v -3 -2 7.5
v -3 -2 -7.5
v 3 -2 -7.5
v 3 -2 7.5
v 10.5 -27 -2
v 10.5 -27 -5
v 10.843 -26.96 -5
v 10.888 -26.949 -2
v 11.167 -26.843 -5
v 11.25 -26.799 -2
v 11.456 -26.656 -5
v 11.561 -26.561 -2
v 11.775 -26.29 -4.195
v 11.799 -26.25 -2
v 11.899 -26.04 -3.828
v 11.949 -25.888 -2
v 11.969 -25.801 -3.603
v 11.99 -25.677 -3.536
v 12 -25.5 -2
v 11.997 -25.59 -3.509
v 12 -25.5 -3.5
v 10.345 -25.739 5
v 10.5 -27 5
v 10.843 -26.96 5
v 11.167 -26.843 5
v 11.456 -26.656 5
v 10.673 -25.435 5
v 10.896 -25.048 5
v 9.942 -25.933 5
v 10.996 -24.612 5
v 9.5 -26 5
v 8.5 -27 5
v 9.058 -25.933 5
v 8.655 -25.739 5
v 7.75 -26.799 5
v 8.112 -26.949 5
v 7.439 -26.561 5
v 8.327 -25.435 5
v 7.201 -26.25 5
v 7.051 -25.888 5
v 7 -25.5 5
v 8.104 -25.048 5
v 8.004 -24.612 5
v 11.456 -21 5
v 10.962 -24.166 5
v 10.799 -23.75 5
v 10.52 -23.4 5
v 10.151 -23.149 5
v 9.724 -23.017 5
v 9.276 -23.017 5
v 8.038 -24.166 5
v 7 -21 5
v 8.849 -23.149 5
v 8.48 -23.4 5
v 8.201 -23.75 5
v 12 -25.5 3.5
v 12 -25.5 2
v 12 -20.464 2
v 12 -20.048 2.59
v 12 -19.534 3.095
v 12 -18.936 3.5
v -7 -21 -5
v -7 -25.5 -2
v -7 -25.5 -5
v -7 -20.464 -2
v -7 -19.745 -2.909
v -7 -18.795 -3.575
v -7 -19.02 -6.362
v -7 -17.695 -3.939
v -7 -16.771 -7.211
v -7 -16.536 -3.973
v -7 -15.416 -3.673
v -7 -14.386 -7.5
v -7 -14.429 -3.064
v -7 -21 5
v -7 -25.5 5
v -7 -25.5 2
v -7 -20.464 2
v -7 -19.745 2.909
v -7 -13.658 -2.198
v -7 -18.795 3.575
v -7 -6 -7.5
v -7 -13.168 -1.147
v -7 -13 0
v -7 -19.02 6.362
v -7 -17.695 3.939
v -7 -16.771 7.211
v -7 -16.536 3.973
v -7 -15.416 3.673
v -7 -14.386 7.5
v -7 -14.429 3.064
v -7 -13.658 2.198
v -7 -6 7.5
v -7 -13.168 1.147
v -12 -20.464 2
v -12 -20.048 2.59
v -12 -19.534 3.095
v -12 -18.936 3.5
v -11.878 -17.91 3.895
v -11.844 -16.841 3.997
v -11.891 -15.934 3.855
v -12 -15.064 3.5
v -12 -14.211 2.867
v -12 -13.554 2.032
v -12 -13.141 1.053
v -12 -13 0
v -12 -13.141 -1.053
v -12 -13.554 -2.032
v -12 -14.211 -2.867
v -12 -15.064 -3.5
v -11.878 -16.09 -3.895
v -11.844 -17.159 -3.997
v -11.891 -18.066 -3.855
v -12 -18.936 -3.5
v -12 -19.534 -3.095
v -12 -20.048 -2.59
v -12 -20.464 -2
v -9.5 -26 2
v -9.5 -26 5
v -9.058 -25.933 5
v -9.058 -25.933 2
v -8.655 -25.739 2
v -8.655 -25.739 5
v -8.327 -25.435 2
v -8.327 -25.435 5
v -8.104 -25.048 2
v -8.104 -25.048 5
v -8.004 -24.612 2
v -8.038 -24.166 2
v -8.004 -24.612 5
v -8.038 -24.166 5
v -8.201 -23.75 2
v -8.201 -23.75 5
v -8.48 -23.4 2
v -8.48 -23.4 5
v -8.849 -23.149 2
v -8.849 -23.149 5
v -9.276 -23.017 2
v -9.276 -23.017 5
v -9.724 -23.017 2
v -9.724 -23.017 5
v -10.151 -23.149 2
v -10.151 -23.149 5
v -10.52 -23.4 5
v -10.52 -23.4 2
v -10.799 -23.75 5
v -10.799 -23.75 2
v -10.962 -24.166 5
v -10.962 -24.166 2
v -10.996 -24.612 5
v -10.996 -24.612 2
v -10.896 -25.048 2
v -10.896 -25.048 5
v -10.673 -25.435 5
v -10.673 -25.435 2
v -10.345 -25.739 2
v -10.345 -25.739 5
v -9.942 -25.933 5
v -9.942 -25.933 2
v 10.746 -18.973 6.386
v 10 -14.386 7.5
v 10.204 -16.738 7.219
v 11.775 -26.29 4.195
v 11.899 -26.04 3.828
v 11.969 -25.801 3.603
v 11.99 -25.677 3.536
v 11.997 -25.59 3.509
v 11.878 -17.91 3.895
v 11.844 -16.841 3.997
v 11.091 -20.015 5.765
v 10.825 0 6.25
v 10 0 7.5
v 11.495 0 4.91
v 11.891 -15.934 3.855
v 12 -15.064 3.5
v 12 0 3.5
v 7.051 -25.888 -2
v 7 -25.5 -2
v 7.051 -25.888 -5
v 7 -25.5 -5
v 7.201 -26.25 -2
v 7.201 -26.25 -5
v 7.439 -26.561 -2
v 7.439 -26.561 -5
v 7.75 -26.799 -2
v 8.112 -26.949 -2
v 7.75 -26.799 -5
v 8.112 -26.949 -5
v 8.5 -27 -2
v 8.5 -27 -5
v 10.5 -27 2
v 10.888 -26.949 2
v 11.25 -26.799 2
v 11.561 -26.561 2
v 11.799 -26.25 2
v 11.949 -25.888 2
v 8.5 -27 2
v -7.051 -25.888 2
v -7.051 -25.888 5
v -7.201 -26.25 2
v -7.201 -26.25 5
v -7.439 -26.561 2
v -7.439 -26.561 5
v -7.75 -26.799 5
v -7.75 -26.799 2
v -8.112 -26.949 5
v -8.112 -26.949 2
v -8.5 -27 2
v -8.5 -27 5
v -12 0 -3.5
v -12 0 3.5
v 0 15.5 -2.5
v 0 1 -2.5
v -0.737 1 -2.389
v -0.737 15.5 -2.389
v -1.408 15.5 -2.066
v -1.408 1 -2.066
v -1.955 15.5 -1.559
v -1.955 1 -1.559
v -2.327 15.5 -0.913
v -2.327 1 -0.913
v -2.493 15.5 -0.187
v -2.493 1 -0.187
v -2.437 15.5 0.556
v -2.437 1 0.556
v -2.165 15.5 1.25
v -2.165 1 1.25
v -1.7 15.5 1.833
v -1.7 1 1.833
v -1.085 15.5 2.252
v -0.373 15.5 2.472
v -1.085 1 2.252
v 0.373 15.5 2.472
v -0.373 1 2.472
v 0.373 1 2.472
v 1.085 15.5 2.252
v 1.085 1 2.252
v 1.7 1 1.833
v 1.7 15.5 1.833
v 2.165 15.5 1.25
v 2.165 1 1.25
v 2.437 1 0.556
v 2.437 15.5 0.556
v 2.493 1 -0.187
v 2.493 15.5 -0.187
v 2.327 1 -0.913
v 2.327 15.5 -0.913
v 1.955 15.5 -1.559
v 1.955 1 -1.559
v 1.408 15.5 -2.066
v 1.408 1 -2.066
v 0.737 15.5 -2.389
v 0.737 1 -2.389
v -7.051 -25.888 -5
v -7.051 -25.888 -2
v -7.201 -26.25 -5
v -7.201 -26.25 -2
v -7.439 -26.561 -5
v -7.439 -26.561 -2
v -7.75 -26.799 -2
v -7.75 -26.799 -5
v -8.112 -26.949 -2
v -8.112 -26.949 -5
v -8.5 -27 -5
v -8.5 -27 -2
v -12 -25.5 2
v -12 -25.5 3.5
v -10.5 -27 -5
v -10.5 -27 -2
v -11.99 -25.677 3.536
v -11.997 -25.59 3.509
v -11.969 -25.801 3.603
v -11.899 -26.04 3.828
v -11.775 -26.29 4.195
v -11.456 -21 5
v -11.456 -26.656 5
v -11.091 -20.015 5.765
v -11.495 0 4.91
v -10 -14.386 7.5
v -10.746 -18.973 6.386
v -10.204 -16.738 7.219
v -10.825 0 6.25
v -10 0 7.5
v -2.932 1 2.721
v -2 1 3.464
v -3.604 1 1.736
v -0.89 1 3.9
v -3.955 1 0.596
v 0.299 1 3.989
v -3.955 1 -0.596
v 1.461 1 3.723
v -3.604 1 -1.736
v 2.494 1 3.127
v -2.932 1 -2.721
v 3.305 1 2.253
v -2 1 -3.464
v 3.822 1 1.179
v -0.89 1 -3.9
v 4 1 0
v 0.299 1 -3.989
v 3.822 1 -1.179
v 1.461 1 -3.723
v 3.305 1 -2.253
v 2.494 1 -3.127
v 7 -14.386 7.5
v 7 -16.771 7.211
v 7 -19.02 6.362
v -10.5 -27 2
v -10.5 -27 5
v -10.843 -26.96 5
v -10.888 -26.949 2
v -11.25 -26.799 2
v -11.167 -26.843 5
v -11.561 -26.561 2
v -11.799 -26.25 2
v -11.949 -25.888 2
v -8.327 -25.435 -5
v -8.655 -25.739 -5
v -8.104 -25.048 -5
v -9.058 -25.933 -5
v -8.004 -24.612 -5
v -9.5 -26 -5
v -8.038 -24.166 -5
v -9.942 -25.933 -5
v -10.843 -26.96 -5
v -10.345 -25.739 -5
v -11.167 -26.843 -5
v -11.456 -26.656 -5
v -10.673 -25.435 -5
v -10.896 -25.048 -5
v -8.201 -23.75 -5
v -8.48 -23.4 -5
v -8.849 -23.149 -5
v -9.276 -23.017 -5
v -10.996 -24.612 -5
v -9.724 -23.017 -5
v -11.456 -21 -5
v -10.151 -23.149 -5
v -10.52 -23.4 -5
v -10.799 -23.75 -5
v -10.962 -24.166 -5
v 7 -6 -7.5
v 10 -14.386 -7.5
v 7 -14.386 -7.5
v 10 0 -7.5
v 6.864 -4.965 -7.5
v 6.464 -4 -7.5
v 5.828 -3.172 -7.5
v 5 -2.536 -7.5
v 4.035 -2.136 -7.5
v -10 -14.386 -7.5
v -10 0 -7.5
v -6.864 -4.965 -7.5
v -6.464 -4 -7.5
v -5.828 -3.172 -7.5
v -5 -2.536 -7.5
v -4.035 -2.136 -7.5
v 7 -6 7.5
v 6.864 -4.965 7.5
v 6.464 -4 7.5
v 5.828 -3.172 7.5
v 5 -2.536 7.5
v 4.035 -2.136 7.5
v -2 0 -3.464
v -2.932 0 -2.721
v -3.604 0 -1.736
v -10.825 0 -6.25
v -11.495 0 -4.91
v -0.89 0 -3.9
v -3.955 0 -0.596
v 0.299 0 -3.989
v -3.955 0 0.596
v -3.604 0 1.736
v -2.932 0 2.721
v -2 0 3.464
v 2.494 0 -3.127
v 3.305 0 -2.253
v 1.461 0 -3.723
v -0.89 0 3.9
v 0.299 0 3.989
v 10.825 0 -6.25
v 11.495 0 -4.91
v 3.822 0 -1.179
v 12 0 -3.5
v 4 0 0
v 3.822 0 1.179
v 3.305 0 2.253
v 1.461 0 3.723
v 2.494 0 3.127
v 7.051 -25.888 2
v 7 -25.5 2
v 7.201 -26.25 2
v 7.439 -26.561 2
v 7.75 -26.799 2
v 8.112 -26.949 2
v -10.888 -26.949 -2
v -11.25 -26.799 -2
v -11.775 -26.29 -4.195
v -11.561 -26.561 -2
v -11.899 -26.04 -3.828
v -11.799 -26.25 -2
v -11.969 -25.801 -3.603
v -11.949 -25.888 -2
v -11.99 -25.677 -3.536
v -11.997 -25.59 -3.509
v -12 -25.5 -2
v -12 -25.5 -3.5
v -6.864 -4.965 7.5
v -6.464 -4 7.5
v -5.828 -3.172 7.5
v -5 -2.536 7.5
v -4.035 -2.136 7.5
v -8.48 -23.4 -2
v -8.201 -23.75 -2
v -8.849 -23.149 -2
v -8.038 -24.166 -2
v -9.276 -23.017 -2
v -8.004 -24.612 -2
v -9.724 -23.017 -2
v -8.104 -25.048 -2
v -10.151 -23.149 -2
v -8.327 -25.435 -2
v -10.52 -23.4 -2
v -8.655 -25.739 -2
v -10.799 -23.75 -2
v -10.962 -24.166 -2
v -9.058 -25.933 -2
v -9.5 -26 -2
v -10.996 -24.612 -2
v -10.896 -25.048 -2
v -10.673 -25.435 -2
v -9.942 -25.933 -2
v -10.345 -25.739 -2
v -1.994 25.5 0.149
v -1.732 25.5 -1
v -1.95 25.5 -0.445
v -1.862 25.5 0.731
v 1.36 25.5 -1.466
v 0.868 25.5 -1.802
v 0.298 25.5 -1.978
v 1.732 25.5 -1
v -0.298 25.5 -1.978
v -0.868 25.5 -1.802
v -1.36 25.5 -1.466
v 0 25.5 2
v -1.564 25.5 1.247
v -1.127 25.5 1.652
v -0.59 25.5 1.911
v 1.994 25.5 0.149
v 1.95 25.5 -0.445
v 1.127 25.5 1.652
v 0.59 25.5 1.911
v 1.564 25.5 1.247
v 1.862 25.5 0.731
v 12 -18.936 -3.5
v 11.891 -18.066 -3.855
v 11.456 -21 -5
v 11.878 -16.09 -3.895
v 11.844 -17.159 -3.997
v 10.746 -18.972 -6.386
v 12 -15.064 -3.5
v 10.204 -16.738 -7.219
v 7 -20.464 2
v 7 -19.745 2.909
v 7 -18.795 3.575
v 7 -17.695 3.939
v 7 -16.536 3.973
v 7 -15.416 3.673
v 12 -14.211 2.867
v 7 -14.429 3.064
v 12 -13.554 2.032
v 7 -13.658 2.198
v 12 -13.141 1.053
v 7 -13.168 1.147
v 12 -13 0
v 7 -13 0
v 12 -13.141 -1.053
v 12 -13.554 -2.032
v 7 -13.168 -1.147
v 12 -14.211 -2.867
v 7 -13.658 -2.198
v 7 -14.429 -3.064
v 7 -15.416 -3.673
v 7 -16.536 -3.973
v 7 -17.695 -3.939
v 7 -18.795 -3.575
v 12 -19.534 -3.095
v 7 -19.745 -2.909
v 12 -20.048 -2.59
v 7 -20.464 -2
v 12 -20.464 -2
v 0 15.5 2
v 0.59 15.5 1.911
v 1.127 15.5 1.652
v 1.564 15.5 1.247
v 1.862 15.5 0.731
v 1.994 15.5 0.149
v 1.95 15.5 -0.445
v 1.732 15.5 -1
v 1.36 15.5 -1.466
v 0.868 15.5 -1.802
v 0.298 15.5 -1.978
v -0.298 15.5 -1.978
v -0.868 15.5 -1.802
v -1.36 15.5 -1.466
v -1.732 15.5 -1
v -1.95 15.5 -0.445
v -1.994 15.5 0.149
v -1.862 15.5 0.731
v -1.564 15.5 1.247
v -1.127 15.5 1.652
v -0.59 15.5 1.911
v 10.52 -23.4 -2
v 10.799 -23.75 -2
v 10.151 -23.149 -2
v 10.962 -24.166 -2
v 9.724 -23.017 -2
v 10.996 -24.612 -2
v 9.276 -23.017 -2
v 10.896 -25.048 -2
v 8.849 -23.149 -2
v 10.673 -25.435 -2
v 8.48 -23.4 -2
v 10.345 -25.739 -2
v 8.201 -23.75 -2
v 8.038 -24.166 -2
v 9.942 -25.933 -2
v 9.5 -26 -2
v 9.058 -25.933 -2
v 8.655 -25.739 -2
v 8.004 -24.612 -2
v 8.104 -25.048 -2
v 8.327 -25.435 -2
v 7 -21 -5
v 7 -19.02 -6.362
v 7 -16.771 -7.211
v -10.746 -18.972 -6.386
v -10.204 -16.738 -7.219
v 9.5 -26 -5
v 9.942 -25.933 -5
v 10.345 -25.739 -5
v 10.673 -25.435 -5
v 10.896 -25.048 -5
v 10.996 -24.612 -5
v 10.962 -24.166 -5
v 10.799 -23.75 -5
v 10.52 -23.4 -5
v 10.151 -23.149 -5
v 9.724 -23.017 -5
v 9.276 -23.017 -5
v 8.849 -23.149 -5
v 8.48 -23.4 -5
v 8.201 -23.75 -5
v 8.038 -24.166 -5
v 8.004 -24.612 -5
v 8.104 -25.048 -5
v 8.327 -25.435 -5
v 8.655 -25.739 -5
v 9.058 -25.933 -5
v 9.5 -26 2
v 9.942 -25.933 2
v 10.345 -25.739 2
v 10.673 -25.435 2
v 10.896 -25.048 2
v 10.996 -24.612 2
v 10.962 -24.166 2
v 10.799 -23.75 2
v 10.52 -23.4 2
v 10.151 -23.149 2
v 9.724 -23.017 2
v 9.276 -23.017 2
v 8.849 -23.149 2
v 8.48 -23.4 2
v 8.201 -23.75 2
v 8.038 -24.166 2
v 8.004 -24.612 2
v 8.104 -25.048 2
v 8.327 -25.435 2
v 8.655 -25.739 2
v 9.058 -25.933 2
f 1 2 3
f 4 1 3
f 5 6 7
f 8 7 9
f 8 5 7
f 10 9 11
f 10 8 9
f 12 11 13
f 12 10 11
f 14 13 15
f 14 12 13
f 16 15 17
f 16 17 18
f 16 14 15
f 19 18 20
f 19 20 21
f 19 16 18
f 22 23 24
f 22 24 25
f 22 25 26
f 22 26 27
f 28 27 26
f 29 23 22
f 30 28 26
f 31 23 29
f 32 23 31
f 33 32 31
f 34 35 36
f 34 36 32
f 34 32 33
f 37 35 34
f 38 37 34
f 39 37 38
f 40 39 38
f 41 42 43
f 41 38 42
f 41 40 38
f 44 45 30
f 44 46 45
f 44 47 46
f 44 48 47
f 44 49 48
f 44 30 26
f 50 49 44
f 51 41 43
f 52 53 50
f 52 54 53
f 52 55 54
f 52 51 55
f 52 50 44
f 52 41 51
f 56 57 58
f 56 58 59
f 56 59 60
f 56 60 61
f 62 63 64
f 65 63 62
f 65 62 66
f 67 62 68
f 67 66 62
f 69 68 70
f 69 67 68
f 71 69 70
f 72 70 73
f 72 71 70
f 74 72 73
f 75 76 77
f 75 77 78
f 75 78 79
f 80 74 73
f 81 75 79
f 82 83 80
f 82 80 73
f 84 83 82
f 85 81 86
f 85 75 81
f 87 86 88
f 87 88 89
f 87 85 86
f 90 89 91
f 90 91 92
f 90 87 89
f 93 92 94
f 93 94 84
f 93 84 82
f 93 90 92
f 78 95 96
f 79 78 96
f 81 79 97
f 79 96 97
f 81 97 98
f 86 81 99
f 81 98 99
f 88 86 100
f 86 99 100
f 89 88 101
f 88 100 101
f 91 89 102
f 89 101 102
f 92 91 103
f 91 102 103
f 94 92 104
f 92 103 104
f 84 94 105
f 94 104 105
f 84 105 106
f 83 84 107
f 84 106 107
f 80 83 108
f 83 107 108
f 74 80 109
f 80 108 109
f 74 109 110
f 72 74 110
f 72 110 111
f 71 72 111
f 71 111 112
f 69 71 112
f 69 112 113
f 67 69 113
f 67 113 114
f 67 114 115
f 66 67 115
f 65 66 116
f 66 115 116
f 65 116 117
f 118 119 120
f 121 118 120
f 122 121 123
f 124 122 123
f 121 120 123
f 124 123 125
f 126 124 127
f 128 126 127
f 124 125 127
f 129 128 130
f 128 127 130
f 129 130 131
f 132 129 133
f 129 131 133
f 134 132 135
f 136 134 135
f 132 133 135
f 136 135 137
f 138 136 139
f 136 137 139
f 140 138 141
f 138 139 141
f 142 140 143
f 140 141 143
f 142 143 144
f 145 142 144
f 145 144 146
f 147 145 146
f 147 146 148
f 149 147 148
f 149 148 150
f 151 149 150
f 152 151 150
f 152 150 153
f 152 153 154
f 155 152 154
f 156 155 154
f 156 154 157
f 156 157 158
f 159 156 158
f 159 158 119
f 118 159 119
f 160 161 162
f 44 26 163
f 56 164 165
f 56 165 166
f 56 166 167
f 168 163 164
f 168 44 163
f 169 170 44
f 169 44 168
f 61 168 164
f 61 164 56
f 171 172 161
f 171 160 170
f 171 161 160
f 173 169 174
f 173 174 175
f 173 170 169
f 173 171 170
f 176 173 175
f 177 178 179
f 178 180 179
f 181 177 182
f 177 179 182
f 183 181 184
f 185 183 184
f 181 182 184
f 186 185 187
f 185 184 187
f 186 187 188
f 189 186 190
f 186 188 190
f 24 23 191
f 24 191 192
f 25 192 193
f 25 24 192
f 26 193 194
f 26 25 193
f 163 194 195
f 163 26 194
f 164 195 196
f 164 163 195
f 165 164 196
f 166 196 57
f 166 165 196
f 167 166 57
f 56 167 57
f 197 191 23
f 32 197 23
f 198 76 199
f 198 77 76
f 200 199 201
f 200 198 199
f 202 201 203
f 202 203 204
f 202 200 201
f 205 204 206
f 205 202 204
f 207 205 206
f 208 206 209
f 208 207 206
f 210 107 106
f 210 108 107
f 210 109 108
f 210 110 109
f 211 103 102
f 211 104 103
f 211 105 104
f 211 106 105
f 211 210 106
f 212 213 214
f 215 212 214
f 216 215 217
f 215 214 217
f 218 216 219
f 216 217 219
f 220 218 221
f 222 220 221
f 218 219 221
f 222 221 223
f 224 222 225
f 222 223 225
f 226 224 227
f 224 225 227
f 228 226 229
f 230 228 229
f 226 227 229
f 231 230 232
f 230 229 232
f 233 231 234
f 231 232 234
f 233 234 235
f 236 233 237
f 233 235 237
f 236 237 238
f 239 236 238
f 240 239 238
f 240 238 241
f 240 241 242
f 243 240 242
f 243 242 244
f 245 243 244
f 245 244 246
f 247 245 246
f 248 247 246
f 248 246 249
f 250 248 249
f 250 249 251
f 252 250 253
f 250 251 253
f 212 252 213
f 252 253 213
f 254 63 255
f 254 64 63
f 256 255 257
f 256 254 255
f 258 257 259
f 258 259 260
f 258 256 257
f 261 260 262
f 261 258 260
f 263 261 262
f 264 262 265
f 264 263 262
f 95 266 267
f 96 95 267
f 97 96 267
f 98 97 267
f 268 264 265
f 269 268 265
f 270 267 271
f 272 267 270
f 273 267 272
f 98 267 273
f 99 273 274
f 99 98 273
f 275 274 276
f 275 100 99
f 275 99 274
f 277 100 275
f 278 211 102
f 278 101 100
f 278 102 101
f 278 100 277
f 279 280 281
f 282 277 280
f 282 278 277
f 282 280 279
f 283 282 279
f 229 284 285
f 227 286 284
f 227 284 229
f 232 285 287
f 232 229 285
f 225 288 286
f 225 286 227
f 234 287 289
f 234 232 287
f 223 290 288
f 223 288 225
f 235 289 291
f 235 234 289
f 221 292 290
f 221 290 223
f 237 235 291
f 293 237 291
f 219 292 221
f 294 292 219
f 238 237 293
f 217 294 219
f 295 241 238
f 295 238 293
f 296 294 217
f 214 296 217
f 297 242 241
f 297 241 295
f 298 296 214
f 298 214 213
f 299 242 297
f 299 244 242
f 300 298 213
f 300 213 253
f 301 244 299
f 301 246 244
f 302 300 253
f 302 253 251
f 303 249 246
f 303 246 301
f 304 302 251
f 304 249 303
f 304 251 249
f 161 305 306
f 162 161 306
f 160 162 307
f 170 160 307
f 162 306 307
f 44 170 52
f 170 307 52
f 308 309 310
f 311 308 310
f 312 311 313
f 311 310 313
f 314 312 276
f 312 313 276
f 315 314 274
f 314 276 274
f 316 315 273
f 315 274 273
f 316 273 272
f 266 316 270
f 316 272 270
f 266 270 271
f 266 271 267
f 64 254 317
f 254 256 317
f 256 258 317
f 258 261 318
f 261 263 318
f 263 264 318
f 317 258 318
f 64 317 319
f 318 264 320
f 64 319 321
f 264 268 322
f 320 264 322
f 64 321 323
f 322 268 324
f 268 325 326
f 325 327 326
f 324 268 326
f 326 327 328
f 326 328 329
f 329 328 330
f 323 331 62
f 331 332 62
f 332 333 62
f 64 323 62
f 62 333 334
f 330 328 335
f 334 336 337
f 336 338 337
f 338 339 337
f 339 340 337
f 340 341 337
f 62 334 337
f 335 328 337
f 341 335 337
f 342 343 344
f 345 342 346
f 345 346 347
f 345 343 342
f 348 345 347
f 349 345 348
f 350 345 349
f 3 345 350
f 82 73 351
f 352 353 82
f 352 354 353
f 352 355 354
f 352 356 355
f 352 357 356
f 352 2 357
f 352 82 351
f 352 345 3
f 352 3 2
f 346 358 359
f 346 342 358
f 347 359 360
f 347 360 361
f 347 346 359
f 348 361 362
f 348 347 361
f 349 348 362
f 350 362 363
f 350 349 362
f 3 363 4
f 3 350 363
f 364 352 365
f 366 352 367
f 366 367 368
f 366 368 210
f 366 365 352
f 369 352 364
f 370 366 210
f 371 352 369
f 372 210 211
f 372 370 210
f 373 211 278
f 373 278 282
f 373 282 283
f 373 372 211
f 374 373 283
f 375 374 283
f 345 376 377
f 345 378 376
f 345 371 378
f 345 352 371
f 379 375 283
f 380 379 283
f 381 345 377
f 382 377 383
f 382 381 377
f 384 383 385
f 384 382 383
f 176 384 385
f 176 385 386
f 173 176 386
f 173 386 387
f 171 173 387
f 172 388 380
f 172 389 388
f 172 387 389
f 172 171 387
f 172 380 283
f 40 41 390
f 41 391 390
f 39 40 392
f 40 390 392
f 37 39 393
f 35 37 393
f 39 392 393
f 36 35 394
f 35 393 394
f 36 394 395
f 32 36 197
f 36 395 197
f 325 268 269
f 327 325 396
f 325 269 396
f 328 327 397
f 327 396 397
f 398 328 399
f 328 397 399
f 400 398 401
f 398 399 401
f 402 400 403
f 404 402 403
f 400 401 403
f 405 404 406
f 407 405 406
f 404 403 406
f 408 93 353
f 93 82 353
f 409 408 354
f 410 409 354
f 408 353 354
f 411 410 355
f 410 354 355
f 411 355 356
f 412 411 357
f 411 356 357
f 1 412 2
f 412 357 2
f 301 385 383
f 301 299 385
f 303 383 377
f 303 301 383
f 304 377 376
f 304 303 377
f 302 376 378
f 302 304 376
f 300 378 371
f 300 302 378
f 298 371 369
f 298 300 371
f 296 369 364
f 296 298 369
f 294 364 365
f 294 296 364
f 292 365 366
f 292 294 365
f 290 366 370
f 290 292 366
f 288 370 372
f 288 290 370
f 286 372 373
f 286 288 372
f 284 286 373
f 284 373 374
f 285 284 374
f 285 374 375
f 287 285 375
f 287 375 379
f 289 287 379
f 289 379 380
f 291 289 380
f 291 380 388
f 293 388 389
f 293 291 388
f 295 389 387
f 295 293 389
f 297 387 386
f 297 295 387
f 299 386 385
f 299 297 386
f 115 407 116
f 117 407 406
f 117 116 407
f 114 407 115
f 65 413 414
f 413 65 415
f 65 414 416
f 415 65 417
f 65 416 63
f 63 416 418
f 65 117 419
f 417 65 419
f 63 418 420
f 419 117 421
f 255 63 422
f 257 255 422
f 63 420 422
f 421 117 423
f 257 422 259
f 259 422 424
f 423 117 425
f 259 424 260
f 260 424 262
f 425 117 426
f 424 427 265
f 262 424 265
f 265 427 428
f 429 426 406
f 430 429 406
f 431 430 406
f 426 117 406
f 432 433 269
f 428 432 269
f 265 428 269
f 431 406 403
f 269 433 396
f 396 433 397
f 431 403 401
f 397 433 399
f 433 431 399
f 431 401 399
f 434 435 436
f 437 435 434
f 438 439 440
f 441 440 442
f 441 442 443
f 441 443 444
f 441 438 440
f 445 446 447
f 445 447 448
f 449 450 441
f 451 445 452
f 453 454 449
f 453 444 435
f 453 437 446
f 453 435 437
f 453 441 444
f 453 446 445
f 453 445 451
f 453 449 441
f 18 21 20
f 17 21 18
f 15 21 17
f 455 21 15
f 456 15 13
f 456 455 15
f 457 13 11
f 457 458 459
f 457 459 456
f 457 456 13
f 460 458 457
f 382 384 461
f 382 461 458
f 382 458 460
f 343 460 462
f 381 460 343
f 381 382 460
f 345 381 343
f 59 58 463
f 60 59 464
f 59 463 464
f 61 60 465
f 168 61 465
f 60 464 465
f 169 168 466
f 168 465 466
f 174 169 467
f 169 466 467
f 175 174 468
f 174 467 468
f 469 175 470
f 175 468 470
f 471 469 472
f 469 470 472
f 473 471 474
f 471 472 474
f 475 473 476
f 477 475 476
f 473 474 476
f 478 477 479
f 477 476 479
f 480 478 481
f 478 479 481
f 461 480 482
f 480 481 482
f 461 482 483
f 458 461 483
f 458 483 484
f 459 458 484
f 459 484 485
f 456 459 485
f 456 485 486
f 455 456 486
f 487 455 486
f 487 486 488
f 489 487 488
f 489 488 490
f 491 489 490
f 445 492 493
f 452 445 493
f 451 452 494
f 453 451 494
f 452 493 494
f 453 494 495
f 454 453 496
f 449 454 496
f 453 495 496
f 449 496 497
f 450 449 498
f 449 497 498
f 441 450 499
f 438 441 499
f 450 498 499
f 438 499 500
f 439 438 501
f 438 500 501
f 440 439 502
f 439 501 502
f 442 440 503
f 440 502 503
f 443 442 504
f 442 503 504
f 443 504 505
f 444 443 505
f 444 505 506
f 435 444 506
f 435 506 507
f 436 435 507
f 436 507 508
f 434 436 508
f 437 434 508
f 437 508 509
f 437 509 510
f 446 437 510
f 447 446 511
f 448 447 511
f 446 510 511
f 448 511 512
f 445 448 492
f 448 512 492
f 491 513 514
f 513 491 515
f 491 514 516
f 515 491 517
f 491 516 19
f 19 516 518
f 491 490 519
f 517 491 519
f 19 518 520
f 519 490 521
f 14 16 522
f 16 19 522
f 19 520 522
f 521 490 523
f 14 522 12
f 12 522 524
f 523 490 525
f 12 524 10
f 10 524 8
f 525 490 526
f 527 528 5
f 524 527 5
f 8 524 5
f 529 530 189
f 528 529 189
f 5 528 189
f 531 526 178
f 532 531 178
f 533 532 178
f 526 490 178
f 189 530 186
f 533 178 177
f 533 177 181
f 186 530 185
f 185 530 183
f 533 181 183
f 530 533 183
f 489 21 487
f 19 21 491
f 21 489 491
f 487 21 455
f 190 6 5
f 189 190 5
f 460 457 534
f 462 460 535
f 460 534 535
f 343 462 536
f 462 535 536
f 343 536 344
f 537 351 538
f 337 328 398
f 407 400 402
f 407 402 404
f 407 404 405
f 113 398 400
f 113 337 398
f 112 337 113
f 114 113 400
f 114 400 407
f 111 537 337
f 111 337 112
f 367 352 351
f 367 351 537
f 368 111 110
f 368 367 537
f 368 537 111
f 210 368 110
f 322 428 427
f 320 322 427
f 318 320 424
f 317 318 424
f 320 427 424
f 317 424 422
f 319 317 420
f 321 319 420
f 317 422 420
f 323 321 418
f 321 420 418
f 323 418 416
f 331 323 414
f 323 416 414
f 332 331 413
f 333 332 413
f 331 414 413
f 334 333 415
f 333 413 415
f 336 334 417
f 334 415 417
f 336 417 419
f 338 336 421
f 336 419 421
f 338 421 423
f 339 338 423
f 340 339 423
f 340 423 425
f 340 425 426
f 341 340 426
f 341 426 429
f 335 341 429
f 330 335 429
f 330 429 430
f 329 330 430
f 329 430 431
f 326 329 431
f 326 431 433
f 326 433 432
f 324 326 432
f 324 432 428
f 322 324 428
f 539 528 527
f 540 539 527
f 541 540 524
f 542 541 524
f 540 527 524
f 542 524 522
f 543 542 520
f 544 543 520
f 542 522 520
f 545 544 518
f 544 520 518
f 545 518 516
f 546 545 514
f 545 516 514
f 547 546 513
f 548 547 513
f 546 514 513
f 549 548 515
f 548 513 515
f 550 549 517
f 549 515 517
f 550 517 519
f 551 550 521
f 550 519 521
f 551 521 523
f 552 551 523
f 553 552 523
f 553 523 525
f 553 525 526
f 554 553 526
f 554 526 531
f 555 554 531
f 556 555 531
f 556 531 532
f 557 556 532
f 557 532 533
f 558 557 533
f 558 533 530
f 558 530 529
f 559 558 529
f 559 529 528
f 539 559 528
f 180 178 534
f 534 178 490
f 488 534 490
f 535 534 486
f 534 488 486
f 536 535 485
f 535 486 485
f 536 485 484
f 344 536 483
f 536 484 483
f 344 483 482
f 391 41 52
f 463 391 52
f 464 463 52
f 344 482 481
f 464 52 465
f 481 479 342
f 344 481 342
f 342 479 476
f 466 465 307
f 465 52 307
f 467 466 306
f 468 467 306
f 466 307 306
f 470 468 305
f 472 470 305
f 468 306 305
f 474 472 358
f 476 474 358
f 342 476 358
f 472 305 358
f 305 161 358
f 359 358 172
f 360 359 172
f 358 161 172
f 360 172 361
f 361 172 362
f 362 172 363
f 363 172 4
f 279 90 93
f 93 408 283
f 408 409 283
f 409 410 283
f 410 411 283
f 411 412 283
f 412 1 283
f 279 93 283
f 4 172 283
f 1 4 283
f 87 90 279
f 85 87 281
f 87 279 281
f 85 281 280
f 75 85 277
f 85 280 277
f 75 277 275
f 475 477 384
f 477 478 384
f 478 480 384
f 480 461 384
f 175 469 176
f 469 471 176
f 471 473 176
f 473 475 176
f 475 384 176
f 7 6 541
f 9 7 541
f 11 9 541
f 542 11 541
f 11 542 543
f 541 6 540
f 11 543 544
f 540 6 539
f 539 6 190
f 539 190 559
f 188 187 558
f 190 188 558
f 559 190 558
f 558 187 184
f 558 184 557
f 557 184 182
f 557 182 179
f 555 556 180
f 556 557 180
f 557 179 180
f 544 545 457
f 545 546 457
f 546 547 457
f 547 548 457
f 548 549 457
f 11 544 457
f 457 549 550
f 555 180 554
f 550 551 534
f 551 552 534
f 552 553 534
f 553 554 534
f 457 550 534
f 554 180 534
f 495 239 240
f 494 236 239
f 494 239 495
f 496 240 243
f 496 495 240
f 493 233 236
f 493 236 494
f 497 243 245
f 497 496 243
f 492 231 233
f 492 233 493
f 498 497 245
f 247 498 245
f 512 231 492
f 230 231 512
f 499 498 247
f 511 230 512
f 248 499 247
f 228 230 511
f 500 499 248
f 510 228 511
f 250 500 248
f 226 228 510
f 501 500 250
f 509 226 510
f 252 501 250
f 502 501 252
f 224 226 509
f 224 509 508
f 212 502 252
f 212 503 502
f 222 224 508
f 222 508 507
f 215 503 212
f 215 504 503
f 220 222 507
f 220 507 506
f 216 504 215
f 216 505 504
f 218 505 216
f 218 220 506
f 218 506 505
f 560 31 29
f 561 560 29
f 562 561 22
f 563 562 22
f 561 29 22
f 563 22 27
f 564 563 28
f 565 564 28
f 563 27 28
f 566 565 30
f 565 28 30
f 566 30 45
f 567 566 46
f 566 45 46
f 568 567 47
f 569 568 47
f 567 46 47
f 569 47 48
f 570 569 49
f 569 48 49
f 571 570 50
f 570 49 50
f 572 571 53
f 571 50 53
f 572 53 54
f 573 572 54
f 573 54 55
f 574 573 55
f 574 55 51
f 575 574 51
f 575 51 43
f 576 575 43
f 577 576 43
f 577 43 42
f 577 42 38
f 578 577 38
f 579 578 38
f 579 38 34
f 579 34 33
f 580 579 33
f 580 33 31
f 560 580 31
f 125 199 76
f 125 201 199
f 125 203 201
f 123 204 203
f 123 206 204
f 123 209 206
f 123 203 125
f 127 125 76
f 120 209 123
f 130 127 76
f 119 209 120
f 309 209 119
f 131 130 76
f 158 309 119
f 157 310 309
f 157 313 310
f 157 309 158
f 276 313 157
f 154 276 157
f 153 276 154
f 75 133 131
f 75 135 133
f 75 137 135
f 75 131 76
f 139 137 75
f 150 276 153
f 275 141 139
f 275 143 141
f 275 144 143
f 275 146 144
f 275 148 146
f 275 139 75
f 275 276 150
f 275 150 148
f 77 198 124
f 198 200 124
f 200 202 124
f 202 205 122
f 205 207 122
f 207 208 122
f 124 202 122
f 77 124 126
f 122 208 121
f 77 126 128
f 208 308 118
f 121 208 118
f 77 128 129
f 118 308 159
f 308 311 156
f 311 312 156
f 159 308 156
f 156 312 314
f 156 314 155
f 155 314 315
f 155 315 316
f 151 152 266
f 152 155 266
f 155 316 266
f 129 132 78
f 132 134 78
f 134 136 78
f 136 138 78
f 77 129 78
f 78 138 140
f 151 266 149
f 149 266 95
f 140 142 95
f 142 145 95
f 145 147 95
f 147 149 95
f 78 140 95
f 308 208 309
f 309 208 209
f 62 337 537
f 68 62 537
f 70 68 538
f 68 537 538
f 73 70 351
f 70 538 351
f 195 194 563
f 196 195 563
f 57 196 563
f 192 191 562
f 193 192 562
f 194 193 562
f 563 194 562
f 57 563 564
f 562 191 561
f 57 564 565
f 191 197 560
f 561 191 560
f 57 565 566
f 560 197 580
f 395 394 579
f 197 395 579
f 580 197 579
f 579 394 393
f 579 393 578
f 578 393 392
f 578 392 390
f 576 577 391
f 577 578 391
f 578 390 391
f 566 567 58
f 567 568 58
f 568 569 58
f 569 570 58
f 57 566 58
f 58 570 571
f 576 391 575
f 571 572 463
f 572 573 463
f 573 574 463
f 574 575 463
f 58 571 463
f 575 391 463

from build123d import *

# Parameters (mm, degrees)
SKETCH_1_R          = 12.5
EXTRUDE_1_DEPTH     = 27
CUT_EXTRUDE_START   = -37
CUT_EXTRUDE_1_DEPTH = 37
CUT_EXTRUDE_START_2 = 10
CUT_EXTRUDE_2_DEPTH = 43
SKETCH_4_W          = 14
SKETCH_4_H          = 25
CUT_EXTRUDE_3_DEPTH = 30
FILLET_1_R          = 4
SKETCH_7_R          = 4
SKETCH_5_R          = 4
CUT_EXTRUDE_4_DEPTH = 34
SKETCH_9_W          = 2.5
SKETCH_9_H          = 6
CUT_EXTRUDE_5_DEPTH = 34
SKETCH_10_R         = 1.5
CUT_EXTRUDE_6_DEPTH = 34
FILLET_3_R          = 1.5
SKETCH_11_R         = 2.5
EXTRUDE_2_DEPTH     = 14.5
SKETCH_12_R         = 2
EXTRUDE_3_DEPTH     = 10
FILLET_4_R          = 10


with BuildPart() as part:
    # 草图1 → 凸台-拉伸1 (new body)
    with BuildSketch(Plane(origin=(0, 0, 0), x_dir=(1, 0, 0), z_dir=(0, 1, 0))):
        with Locations(Location((0, 0, 0), (0, 0, 270))):
            Circle(SKETCH_1_R)
    extrude(amount=-EXTRUDE_1_DEPTH)

    # 草图2 → 切除-拉伸1 (cut)
    with BuildSketch(Plane(origin=(0, -27, 0), x_dir=(-1, 0, 0), z_dir=(0, -1, 0)).offset(CUT_EXTRUDE_START)):
        with BuildLine():
            Line((-10, 7.5), (10, 7.5))
            ThreePointArc((10, 7.5), (0, 12.5), (-10, 7.5))
        make_face()
        with BuildLine():
            Line((-10, -7.5), (10, -7.5))
            ThreePointArc((10, -7.5), (0, -12.5), (-10, -7.5))
        make_face()
    extrude(amount=CUT_EXTRUDE_1_DEPTH, mode=Mode.SUBTRACT)

    # 草图3 → 切除-拉伸2 (cut)
    with BuildSketch(Plane(origin=(0, 0, 0), x_dir=(1, 0, 0), z_dir=(0, 1, 0)).offset(CUT_EXTRUDE_START_2)):
        with BuildLine():
            Line((-12, 3.5), (-12, -3.5))
            ThreePointArc((-12, -3.5), (-12.5, 0), (-12, 3.5))
        make_face()
        with BuildLine():
            Line((12, 3.5), (12, -3.5))
            ThreePointArc((12, -3.5), (12.5, 0), (12, 3.5))
        make_face()
    extrude(amount=-CUT_EXTRUDE_2_DEPTH, mode=Mode.SUBTRACT)

    # 草图4 → 切除-拉伸3 (cut)
    with BuildSketch(Plane.XY.offset(7.5)):
        with Locations((0, -14.5)):
            Rectangle(SKETCH_4_W, SKETCH_4_H)
    extrude(amount=-CUT_EXTRUDE_3_DEPTH, mode=Mode.SUBTRACT)

    # 圆角1
    fillet_1_edges = [part.edges().sort_by_distance(p)[0] for p in [
        (-7, -2, 0),
        (7, -2, 0),
    ]]
    fillet(fillet_1_edges, radius=FILLET_1_R)

    # 草图7 → 放样2 section 0
    with BuildSketch(Plane(origin=(0, 0, 0), x_dir=(1, 0, 0), z_dir=(0, 1, 0))):
        Circle(SKETCH_7_R)
    # 草图5 → 放样2 section 1
    with BuildSketch(Plane(origin=(0, 1, 0), x_dir=(1, 0, 0), z_dir=(0, 1, 0))):
        Circle(SKETCH_5_R)
    loft()

    # 草图8 → 切除-拉伸4 (cut)
    with BuildSketch(Plane.ZY.offset(12)):
        with BuildLine():
            Line((-2, -27), (2, -27))
            Line((2, -27), (2, -20.464101615))
            ThreePointArc((2, -20.464101615), (0, -13), (-2, -20.464101615))
            Line((-2, -20.464101615), (-2, -27))
        make_face()
    extrude(amount=-CUT_EXTRUDE_4_DEPTH, mode=Mode.SUBTRACT)

    # 草图9 → 切除-拉伸5 (cut)
    with BuildSketch(Plane.ZY.offset(12)):
        with Locations((6.25, -24)):
            Rectangle(SKETCH_9_W, SKETCH_9_H)
        with Locations((-6.25, -24)):
            Rectangle(SKETCH_9_W, SKETCH_9_H)
    extrude(amount=-CUT_EXTRUDE_5_DEPTH, mode=Mode.SUBTRACT)

    # 草图10 → 切除-拉伸6 (cut)
    with BuildSketch(Plane.XY.offset(5)):
        with Locations(Location((-9.5, -24.5, 0), (0, 0, 270))):
            Circle(SKETCH_10_R)
        with Locations(Location((9.5, -24.5, 0), (0, 0, 270))):
            Circle(SKETCH_10_R)
    extrude(amount=-CUT_EXTRUDE_6_DEPTH, mode=Mode.SUBTRACT)

    # 圆角3
    fillet_3_edges = [part.edges().sort_by_distance(p)[0] for p in [
        (-12, -27, 2.75),
        (-12, -27, -2.75),
        (-7, -27, -3.5),
        (-7, -27, 3.5),
        (7, -27, -3.5),
        (7, -27, 3.5),
        (12, -27, 2.75),
        (12, -27, -2.75),
    ]]
    fillet(fillet_3_edges, radius=FILLET_3_R)

    # 草图11 → 凸台-拉伸2 (add)
    with BuildSketch(Plane(origin=(0, 1, 0), x_dir=(1, 0, 0), z_dir=(0, 1, 0))):
        with Locations(Location((0, 0, 0), (0, 0, 90))):
            Circle(SKETCH_11_R)
    extrude(amount=EXTRUDE_2_DEPTH)

    # 草图12 → 凸台-拉伸3 (add)
    with BuildSketch(Plane(origin=(0, 15.5, 0), x_dir=(1, 0, 0), z_dir=(0, 1, 0))):
        with Locations(Location((0, 0, 0), (0, 0, 270))):
            Circle(SKETCH_12_R)
    extrude(amount=EXTRUDE_3_DEPTH)

    # 圆角4
    # the kernel refuses this fillet: 10 mm, written as the material it takes off along each edge
    with BuildSketch(Plane(origin=(-9.535945694, -21, 7.5), x_dir=(0, 1, 0), z_dir=(1, 0, 0)), Plane(origin=(-26.535945694, -21, 7.5), x_dir=(0, 1, 0), z_dir=(1, 0, 0))) as fillet_4_piece_1:
        with BuildLine():
            CenterArc((6.614378278, -10), FILLET_4_R, 90, 41.409622109)
            Line((0, -2.5), (-0.132287566, -2.35))
            ThreePointArc((-0.132287566, -2.35), (-0.2, -1.25), (-0.2, 0))
            Line((-0.2, 0), (0, 0.2))
            Line((0, 0.2), (6.614378278, 0.2))
            Line((6.614378278, 0.2), (6.614378278, 0))
        make_face()
    extrude(amount=36.071891388, mode=Mode.SUBTRACT)
    with BuildSketch(Plane(origin=(-9.535945694, -21, -7.5), x_dir=(0, 0, 1), z_dir=(1, 0, 0))) as fillet_4_piece_2:
        with BuildLine():
            CenterArc((10, -6.614378278), FILLET_4_R, 138.590377891, 41.409622109)
            Line((0, -6.614378278), (-0.2, -6.614378278))
            Line((-0.2, -6.614378278), (-0.2, 0))
            Line((-0.2, 0), (0, 0.2))
            ThreePointArc((0, 0.2), (1.25, 0.2), (2.35, 0.132287566))
            Line((2.35, 0.132287566), (2.5, 0))
        make_face()
    extrude(amount=36.071891388, mode=Mode.SUBTRACT)
    with BuildSketch(Plane(origin=(-26.535945694, -21, -7.5), x_dir=(0, 1, 0), z_dir=(1, 0, 0))) as fillet_4_piece_3:
        with BuildLine():
            CenterArc((6.614378278, 10), FILLET_4_R, 228.590377891, 41.409622109)
            Line((0, 2.5), (-0.132287566, 2.35))
            ThreePointArc((-0.132287566, 2.35), (-0.2, 1.25), (-0.2, 0))
            Line((-0.2, 0), (0, -0.2))
            Line((0, -0.2), (6.614378278, -0.2))
            Line((6.614378278, -0.2), (6.614378278, 0))
        make_face()
    extrude(amount=36.071891388, mode=Mode.SUBTRACT)


solid = part.part
